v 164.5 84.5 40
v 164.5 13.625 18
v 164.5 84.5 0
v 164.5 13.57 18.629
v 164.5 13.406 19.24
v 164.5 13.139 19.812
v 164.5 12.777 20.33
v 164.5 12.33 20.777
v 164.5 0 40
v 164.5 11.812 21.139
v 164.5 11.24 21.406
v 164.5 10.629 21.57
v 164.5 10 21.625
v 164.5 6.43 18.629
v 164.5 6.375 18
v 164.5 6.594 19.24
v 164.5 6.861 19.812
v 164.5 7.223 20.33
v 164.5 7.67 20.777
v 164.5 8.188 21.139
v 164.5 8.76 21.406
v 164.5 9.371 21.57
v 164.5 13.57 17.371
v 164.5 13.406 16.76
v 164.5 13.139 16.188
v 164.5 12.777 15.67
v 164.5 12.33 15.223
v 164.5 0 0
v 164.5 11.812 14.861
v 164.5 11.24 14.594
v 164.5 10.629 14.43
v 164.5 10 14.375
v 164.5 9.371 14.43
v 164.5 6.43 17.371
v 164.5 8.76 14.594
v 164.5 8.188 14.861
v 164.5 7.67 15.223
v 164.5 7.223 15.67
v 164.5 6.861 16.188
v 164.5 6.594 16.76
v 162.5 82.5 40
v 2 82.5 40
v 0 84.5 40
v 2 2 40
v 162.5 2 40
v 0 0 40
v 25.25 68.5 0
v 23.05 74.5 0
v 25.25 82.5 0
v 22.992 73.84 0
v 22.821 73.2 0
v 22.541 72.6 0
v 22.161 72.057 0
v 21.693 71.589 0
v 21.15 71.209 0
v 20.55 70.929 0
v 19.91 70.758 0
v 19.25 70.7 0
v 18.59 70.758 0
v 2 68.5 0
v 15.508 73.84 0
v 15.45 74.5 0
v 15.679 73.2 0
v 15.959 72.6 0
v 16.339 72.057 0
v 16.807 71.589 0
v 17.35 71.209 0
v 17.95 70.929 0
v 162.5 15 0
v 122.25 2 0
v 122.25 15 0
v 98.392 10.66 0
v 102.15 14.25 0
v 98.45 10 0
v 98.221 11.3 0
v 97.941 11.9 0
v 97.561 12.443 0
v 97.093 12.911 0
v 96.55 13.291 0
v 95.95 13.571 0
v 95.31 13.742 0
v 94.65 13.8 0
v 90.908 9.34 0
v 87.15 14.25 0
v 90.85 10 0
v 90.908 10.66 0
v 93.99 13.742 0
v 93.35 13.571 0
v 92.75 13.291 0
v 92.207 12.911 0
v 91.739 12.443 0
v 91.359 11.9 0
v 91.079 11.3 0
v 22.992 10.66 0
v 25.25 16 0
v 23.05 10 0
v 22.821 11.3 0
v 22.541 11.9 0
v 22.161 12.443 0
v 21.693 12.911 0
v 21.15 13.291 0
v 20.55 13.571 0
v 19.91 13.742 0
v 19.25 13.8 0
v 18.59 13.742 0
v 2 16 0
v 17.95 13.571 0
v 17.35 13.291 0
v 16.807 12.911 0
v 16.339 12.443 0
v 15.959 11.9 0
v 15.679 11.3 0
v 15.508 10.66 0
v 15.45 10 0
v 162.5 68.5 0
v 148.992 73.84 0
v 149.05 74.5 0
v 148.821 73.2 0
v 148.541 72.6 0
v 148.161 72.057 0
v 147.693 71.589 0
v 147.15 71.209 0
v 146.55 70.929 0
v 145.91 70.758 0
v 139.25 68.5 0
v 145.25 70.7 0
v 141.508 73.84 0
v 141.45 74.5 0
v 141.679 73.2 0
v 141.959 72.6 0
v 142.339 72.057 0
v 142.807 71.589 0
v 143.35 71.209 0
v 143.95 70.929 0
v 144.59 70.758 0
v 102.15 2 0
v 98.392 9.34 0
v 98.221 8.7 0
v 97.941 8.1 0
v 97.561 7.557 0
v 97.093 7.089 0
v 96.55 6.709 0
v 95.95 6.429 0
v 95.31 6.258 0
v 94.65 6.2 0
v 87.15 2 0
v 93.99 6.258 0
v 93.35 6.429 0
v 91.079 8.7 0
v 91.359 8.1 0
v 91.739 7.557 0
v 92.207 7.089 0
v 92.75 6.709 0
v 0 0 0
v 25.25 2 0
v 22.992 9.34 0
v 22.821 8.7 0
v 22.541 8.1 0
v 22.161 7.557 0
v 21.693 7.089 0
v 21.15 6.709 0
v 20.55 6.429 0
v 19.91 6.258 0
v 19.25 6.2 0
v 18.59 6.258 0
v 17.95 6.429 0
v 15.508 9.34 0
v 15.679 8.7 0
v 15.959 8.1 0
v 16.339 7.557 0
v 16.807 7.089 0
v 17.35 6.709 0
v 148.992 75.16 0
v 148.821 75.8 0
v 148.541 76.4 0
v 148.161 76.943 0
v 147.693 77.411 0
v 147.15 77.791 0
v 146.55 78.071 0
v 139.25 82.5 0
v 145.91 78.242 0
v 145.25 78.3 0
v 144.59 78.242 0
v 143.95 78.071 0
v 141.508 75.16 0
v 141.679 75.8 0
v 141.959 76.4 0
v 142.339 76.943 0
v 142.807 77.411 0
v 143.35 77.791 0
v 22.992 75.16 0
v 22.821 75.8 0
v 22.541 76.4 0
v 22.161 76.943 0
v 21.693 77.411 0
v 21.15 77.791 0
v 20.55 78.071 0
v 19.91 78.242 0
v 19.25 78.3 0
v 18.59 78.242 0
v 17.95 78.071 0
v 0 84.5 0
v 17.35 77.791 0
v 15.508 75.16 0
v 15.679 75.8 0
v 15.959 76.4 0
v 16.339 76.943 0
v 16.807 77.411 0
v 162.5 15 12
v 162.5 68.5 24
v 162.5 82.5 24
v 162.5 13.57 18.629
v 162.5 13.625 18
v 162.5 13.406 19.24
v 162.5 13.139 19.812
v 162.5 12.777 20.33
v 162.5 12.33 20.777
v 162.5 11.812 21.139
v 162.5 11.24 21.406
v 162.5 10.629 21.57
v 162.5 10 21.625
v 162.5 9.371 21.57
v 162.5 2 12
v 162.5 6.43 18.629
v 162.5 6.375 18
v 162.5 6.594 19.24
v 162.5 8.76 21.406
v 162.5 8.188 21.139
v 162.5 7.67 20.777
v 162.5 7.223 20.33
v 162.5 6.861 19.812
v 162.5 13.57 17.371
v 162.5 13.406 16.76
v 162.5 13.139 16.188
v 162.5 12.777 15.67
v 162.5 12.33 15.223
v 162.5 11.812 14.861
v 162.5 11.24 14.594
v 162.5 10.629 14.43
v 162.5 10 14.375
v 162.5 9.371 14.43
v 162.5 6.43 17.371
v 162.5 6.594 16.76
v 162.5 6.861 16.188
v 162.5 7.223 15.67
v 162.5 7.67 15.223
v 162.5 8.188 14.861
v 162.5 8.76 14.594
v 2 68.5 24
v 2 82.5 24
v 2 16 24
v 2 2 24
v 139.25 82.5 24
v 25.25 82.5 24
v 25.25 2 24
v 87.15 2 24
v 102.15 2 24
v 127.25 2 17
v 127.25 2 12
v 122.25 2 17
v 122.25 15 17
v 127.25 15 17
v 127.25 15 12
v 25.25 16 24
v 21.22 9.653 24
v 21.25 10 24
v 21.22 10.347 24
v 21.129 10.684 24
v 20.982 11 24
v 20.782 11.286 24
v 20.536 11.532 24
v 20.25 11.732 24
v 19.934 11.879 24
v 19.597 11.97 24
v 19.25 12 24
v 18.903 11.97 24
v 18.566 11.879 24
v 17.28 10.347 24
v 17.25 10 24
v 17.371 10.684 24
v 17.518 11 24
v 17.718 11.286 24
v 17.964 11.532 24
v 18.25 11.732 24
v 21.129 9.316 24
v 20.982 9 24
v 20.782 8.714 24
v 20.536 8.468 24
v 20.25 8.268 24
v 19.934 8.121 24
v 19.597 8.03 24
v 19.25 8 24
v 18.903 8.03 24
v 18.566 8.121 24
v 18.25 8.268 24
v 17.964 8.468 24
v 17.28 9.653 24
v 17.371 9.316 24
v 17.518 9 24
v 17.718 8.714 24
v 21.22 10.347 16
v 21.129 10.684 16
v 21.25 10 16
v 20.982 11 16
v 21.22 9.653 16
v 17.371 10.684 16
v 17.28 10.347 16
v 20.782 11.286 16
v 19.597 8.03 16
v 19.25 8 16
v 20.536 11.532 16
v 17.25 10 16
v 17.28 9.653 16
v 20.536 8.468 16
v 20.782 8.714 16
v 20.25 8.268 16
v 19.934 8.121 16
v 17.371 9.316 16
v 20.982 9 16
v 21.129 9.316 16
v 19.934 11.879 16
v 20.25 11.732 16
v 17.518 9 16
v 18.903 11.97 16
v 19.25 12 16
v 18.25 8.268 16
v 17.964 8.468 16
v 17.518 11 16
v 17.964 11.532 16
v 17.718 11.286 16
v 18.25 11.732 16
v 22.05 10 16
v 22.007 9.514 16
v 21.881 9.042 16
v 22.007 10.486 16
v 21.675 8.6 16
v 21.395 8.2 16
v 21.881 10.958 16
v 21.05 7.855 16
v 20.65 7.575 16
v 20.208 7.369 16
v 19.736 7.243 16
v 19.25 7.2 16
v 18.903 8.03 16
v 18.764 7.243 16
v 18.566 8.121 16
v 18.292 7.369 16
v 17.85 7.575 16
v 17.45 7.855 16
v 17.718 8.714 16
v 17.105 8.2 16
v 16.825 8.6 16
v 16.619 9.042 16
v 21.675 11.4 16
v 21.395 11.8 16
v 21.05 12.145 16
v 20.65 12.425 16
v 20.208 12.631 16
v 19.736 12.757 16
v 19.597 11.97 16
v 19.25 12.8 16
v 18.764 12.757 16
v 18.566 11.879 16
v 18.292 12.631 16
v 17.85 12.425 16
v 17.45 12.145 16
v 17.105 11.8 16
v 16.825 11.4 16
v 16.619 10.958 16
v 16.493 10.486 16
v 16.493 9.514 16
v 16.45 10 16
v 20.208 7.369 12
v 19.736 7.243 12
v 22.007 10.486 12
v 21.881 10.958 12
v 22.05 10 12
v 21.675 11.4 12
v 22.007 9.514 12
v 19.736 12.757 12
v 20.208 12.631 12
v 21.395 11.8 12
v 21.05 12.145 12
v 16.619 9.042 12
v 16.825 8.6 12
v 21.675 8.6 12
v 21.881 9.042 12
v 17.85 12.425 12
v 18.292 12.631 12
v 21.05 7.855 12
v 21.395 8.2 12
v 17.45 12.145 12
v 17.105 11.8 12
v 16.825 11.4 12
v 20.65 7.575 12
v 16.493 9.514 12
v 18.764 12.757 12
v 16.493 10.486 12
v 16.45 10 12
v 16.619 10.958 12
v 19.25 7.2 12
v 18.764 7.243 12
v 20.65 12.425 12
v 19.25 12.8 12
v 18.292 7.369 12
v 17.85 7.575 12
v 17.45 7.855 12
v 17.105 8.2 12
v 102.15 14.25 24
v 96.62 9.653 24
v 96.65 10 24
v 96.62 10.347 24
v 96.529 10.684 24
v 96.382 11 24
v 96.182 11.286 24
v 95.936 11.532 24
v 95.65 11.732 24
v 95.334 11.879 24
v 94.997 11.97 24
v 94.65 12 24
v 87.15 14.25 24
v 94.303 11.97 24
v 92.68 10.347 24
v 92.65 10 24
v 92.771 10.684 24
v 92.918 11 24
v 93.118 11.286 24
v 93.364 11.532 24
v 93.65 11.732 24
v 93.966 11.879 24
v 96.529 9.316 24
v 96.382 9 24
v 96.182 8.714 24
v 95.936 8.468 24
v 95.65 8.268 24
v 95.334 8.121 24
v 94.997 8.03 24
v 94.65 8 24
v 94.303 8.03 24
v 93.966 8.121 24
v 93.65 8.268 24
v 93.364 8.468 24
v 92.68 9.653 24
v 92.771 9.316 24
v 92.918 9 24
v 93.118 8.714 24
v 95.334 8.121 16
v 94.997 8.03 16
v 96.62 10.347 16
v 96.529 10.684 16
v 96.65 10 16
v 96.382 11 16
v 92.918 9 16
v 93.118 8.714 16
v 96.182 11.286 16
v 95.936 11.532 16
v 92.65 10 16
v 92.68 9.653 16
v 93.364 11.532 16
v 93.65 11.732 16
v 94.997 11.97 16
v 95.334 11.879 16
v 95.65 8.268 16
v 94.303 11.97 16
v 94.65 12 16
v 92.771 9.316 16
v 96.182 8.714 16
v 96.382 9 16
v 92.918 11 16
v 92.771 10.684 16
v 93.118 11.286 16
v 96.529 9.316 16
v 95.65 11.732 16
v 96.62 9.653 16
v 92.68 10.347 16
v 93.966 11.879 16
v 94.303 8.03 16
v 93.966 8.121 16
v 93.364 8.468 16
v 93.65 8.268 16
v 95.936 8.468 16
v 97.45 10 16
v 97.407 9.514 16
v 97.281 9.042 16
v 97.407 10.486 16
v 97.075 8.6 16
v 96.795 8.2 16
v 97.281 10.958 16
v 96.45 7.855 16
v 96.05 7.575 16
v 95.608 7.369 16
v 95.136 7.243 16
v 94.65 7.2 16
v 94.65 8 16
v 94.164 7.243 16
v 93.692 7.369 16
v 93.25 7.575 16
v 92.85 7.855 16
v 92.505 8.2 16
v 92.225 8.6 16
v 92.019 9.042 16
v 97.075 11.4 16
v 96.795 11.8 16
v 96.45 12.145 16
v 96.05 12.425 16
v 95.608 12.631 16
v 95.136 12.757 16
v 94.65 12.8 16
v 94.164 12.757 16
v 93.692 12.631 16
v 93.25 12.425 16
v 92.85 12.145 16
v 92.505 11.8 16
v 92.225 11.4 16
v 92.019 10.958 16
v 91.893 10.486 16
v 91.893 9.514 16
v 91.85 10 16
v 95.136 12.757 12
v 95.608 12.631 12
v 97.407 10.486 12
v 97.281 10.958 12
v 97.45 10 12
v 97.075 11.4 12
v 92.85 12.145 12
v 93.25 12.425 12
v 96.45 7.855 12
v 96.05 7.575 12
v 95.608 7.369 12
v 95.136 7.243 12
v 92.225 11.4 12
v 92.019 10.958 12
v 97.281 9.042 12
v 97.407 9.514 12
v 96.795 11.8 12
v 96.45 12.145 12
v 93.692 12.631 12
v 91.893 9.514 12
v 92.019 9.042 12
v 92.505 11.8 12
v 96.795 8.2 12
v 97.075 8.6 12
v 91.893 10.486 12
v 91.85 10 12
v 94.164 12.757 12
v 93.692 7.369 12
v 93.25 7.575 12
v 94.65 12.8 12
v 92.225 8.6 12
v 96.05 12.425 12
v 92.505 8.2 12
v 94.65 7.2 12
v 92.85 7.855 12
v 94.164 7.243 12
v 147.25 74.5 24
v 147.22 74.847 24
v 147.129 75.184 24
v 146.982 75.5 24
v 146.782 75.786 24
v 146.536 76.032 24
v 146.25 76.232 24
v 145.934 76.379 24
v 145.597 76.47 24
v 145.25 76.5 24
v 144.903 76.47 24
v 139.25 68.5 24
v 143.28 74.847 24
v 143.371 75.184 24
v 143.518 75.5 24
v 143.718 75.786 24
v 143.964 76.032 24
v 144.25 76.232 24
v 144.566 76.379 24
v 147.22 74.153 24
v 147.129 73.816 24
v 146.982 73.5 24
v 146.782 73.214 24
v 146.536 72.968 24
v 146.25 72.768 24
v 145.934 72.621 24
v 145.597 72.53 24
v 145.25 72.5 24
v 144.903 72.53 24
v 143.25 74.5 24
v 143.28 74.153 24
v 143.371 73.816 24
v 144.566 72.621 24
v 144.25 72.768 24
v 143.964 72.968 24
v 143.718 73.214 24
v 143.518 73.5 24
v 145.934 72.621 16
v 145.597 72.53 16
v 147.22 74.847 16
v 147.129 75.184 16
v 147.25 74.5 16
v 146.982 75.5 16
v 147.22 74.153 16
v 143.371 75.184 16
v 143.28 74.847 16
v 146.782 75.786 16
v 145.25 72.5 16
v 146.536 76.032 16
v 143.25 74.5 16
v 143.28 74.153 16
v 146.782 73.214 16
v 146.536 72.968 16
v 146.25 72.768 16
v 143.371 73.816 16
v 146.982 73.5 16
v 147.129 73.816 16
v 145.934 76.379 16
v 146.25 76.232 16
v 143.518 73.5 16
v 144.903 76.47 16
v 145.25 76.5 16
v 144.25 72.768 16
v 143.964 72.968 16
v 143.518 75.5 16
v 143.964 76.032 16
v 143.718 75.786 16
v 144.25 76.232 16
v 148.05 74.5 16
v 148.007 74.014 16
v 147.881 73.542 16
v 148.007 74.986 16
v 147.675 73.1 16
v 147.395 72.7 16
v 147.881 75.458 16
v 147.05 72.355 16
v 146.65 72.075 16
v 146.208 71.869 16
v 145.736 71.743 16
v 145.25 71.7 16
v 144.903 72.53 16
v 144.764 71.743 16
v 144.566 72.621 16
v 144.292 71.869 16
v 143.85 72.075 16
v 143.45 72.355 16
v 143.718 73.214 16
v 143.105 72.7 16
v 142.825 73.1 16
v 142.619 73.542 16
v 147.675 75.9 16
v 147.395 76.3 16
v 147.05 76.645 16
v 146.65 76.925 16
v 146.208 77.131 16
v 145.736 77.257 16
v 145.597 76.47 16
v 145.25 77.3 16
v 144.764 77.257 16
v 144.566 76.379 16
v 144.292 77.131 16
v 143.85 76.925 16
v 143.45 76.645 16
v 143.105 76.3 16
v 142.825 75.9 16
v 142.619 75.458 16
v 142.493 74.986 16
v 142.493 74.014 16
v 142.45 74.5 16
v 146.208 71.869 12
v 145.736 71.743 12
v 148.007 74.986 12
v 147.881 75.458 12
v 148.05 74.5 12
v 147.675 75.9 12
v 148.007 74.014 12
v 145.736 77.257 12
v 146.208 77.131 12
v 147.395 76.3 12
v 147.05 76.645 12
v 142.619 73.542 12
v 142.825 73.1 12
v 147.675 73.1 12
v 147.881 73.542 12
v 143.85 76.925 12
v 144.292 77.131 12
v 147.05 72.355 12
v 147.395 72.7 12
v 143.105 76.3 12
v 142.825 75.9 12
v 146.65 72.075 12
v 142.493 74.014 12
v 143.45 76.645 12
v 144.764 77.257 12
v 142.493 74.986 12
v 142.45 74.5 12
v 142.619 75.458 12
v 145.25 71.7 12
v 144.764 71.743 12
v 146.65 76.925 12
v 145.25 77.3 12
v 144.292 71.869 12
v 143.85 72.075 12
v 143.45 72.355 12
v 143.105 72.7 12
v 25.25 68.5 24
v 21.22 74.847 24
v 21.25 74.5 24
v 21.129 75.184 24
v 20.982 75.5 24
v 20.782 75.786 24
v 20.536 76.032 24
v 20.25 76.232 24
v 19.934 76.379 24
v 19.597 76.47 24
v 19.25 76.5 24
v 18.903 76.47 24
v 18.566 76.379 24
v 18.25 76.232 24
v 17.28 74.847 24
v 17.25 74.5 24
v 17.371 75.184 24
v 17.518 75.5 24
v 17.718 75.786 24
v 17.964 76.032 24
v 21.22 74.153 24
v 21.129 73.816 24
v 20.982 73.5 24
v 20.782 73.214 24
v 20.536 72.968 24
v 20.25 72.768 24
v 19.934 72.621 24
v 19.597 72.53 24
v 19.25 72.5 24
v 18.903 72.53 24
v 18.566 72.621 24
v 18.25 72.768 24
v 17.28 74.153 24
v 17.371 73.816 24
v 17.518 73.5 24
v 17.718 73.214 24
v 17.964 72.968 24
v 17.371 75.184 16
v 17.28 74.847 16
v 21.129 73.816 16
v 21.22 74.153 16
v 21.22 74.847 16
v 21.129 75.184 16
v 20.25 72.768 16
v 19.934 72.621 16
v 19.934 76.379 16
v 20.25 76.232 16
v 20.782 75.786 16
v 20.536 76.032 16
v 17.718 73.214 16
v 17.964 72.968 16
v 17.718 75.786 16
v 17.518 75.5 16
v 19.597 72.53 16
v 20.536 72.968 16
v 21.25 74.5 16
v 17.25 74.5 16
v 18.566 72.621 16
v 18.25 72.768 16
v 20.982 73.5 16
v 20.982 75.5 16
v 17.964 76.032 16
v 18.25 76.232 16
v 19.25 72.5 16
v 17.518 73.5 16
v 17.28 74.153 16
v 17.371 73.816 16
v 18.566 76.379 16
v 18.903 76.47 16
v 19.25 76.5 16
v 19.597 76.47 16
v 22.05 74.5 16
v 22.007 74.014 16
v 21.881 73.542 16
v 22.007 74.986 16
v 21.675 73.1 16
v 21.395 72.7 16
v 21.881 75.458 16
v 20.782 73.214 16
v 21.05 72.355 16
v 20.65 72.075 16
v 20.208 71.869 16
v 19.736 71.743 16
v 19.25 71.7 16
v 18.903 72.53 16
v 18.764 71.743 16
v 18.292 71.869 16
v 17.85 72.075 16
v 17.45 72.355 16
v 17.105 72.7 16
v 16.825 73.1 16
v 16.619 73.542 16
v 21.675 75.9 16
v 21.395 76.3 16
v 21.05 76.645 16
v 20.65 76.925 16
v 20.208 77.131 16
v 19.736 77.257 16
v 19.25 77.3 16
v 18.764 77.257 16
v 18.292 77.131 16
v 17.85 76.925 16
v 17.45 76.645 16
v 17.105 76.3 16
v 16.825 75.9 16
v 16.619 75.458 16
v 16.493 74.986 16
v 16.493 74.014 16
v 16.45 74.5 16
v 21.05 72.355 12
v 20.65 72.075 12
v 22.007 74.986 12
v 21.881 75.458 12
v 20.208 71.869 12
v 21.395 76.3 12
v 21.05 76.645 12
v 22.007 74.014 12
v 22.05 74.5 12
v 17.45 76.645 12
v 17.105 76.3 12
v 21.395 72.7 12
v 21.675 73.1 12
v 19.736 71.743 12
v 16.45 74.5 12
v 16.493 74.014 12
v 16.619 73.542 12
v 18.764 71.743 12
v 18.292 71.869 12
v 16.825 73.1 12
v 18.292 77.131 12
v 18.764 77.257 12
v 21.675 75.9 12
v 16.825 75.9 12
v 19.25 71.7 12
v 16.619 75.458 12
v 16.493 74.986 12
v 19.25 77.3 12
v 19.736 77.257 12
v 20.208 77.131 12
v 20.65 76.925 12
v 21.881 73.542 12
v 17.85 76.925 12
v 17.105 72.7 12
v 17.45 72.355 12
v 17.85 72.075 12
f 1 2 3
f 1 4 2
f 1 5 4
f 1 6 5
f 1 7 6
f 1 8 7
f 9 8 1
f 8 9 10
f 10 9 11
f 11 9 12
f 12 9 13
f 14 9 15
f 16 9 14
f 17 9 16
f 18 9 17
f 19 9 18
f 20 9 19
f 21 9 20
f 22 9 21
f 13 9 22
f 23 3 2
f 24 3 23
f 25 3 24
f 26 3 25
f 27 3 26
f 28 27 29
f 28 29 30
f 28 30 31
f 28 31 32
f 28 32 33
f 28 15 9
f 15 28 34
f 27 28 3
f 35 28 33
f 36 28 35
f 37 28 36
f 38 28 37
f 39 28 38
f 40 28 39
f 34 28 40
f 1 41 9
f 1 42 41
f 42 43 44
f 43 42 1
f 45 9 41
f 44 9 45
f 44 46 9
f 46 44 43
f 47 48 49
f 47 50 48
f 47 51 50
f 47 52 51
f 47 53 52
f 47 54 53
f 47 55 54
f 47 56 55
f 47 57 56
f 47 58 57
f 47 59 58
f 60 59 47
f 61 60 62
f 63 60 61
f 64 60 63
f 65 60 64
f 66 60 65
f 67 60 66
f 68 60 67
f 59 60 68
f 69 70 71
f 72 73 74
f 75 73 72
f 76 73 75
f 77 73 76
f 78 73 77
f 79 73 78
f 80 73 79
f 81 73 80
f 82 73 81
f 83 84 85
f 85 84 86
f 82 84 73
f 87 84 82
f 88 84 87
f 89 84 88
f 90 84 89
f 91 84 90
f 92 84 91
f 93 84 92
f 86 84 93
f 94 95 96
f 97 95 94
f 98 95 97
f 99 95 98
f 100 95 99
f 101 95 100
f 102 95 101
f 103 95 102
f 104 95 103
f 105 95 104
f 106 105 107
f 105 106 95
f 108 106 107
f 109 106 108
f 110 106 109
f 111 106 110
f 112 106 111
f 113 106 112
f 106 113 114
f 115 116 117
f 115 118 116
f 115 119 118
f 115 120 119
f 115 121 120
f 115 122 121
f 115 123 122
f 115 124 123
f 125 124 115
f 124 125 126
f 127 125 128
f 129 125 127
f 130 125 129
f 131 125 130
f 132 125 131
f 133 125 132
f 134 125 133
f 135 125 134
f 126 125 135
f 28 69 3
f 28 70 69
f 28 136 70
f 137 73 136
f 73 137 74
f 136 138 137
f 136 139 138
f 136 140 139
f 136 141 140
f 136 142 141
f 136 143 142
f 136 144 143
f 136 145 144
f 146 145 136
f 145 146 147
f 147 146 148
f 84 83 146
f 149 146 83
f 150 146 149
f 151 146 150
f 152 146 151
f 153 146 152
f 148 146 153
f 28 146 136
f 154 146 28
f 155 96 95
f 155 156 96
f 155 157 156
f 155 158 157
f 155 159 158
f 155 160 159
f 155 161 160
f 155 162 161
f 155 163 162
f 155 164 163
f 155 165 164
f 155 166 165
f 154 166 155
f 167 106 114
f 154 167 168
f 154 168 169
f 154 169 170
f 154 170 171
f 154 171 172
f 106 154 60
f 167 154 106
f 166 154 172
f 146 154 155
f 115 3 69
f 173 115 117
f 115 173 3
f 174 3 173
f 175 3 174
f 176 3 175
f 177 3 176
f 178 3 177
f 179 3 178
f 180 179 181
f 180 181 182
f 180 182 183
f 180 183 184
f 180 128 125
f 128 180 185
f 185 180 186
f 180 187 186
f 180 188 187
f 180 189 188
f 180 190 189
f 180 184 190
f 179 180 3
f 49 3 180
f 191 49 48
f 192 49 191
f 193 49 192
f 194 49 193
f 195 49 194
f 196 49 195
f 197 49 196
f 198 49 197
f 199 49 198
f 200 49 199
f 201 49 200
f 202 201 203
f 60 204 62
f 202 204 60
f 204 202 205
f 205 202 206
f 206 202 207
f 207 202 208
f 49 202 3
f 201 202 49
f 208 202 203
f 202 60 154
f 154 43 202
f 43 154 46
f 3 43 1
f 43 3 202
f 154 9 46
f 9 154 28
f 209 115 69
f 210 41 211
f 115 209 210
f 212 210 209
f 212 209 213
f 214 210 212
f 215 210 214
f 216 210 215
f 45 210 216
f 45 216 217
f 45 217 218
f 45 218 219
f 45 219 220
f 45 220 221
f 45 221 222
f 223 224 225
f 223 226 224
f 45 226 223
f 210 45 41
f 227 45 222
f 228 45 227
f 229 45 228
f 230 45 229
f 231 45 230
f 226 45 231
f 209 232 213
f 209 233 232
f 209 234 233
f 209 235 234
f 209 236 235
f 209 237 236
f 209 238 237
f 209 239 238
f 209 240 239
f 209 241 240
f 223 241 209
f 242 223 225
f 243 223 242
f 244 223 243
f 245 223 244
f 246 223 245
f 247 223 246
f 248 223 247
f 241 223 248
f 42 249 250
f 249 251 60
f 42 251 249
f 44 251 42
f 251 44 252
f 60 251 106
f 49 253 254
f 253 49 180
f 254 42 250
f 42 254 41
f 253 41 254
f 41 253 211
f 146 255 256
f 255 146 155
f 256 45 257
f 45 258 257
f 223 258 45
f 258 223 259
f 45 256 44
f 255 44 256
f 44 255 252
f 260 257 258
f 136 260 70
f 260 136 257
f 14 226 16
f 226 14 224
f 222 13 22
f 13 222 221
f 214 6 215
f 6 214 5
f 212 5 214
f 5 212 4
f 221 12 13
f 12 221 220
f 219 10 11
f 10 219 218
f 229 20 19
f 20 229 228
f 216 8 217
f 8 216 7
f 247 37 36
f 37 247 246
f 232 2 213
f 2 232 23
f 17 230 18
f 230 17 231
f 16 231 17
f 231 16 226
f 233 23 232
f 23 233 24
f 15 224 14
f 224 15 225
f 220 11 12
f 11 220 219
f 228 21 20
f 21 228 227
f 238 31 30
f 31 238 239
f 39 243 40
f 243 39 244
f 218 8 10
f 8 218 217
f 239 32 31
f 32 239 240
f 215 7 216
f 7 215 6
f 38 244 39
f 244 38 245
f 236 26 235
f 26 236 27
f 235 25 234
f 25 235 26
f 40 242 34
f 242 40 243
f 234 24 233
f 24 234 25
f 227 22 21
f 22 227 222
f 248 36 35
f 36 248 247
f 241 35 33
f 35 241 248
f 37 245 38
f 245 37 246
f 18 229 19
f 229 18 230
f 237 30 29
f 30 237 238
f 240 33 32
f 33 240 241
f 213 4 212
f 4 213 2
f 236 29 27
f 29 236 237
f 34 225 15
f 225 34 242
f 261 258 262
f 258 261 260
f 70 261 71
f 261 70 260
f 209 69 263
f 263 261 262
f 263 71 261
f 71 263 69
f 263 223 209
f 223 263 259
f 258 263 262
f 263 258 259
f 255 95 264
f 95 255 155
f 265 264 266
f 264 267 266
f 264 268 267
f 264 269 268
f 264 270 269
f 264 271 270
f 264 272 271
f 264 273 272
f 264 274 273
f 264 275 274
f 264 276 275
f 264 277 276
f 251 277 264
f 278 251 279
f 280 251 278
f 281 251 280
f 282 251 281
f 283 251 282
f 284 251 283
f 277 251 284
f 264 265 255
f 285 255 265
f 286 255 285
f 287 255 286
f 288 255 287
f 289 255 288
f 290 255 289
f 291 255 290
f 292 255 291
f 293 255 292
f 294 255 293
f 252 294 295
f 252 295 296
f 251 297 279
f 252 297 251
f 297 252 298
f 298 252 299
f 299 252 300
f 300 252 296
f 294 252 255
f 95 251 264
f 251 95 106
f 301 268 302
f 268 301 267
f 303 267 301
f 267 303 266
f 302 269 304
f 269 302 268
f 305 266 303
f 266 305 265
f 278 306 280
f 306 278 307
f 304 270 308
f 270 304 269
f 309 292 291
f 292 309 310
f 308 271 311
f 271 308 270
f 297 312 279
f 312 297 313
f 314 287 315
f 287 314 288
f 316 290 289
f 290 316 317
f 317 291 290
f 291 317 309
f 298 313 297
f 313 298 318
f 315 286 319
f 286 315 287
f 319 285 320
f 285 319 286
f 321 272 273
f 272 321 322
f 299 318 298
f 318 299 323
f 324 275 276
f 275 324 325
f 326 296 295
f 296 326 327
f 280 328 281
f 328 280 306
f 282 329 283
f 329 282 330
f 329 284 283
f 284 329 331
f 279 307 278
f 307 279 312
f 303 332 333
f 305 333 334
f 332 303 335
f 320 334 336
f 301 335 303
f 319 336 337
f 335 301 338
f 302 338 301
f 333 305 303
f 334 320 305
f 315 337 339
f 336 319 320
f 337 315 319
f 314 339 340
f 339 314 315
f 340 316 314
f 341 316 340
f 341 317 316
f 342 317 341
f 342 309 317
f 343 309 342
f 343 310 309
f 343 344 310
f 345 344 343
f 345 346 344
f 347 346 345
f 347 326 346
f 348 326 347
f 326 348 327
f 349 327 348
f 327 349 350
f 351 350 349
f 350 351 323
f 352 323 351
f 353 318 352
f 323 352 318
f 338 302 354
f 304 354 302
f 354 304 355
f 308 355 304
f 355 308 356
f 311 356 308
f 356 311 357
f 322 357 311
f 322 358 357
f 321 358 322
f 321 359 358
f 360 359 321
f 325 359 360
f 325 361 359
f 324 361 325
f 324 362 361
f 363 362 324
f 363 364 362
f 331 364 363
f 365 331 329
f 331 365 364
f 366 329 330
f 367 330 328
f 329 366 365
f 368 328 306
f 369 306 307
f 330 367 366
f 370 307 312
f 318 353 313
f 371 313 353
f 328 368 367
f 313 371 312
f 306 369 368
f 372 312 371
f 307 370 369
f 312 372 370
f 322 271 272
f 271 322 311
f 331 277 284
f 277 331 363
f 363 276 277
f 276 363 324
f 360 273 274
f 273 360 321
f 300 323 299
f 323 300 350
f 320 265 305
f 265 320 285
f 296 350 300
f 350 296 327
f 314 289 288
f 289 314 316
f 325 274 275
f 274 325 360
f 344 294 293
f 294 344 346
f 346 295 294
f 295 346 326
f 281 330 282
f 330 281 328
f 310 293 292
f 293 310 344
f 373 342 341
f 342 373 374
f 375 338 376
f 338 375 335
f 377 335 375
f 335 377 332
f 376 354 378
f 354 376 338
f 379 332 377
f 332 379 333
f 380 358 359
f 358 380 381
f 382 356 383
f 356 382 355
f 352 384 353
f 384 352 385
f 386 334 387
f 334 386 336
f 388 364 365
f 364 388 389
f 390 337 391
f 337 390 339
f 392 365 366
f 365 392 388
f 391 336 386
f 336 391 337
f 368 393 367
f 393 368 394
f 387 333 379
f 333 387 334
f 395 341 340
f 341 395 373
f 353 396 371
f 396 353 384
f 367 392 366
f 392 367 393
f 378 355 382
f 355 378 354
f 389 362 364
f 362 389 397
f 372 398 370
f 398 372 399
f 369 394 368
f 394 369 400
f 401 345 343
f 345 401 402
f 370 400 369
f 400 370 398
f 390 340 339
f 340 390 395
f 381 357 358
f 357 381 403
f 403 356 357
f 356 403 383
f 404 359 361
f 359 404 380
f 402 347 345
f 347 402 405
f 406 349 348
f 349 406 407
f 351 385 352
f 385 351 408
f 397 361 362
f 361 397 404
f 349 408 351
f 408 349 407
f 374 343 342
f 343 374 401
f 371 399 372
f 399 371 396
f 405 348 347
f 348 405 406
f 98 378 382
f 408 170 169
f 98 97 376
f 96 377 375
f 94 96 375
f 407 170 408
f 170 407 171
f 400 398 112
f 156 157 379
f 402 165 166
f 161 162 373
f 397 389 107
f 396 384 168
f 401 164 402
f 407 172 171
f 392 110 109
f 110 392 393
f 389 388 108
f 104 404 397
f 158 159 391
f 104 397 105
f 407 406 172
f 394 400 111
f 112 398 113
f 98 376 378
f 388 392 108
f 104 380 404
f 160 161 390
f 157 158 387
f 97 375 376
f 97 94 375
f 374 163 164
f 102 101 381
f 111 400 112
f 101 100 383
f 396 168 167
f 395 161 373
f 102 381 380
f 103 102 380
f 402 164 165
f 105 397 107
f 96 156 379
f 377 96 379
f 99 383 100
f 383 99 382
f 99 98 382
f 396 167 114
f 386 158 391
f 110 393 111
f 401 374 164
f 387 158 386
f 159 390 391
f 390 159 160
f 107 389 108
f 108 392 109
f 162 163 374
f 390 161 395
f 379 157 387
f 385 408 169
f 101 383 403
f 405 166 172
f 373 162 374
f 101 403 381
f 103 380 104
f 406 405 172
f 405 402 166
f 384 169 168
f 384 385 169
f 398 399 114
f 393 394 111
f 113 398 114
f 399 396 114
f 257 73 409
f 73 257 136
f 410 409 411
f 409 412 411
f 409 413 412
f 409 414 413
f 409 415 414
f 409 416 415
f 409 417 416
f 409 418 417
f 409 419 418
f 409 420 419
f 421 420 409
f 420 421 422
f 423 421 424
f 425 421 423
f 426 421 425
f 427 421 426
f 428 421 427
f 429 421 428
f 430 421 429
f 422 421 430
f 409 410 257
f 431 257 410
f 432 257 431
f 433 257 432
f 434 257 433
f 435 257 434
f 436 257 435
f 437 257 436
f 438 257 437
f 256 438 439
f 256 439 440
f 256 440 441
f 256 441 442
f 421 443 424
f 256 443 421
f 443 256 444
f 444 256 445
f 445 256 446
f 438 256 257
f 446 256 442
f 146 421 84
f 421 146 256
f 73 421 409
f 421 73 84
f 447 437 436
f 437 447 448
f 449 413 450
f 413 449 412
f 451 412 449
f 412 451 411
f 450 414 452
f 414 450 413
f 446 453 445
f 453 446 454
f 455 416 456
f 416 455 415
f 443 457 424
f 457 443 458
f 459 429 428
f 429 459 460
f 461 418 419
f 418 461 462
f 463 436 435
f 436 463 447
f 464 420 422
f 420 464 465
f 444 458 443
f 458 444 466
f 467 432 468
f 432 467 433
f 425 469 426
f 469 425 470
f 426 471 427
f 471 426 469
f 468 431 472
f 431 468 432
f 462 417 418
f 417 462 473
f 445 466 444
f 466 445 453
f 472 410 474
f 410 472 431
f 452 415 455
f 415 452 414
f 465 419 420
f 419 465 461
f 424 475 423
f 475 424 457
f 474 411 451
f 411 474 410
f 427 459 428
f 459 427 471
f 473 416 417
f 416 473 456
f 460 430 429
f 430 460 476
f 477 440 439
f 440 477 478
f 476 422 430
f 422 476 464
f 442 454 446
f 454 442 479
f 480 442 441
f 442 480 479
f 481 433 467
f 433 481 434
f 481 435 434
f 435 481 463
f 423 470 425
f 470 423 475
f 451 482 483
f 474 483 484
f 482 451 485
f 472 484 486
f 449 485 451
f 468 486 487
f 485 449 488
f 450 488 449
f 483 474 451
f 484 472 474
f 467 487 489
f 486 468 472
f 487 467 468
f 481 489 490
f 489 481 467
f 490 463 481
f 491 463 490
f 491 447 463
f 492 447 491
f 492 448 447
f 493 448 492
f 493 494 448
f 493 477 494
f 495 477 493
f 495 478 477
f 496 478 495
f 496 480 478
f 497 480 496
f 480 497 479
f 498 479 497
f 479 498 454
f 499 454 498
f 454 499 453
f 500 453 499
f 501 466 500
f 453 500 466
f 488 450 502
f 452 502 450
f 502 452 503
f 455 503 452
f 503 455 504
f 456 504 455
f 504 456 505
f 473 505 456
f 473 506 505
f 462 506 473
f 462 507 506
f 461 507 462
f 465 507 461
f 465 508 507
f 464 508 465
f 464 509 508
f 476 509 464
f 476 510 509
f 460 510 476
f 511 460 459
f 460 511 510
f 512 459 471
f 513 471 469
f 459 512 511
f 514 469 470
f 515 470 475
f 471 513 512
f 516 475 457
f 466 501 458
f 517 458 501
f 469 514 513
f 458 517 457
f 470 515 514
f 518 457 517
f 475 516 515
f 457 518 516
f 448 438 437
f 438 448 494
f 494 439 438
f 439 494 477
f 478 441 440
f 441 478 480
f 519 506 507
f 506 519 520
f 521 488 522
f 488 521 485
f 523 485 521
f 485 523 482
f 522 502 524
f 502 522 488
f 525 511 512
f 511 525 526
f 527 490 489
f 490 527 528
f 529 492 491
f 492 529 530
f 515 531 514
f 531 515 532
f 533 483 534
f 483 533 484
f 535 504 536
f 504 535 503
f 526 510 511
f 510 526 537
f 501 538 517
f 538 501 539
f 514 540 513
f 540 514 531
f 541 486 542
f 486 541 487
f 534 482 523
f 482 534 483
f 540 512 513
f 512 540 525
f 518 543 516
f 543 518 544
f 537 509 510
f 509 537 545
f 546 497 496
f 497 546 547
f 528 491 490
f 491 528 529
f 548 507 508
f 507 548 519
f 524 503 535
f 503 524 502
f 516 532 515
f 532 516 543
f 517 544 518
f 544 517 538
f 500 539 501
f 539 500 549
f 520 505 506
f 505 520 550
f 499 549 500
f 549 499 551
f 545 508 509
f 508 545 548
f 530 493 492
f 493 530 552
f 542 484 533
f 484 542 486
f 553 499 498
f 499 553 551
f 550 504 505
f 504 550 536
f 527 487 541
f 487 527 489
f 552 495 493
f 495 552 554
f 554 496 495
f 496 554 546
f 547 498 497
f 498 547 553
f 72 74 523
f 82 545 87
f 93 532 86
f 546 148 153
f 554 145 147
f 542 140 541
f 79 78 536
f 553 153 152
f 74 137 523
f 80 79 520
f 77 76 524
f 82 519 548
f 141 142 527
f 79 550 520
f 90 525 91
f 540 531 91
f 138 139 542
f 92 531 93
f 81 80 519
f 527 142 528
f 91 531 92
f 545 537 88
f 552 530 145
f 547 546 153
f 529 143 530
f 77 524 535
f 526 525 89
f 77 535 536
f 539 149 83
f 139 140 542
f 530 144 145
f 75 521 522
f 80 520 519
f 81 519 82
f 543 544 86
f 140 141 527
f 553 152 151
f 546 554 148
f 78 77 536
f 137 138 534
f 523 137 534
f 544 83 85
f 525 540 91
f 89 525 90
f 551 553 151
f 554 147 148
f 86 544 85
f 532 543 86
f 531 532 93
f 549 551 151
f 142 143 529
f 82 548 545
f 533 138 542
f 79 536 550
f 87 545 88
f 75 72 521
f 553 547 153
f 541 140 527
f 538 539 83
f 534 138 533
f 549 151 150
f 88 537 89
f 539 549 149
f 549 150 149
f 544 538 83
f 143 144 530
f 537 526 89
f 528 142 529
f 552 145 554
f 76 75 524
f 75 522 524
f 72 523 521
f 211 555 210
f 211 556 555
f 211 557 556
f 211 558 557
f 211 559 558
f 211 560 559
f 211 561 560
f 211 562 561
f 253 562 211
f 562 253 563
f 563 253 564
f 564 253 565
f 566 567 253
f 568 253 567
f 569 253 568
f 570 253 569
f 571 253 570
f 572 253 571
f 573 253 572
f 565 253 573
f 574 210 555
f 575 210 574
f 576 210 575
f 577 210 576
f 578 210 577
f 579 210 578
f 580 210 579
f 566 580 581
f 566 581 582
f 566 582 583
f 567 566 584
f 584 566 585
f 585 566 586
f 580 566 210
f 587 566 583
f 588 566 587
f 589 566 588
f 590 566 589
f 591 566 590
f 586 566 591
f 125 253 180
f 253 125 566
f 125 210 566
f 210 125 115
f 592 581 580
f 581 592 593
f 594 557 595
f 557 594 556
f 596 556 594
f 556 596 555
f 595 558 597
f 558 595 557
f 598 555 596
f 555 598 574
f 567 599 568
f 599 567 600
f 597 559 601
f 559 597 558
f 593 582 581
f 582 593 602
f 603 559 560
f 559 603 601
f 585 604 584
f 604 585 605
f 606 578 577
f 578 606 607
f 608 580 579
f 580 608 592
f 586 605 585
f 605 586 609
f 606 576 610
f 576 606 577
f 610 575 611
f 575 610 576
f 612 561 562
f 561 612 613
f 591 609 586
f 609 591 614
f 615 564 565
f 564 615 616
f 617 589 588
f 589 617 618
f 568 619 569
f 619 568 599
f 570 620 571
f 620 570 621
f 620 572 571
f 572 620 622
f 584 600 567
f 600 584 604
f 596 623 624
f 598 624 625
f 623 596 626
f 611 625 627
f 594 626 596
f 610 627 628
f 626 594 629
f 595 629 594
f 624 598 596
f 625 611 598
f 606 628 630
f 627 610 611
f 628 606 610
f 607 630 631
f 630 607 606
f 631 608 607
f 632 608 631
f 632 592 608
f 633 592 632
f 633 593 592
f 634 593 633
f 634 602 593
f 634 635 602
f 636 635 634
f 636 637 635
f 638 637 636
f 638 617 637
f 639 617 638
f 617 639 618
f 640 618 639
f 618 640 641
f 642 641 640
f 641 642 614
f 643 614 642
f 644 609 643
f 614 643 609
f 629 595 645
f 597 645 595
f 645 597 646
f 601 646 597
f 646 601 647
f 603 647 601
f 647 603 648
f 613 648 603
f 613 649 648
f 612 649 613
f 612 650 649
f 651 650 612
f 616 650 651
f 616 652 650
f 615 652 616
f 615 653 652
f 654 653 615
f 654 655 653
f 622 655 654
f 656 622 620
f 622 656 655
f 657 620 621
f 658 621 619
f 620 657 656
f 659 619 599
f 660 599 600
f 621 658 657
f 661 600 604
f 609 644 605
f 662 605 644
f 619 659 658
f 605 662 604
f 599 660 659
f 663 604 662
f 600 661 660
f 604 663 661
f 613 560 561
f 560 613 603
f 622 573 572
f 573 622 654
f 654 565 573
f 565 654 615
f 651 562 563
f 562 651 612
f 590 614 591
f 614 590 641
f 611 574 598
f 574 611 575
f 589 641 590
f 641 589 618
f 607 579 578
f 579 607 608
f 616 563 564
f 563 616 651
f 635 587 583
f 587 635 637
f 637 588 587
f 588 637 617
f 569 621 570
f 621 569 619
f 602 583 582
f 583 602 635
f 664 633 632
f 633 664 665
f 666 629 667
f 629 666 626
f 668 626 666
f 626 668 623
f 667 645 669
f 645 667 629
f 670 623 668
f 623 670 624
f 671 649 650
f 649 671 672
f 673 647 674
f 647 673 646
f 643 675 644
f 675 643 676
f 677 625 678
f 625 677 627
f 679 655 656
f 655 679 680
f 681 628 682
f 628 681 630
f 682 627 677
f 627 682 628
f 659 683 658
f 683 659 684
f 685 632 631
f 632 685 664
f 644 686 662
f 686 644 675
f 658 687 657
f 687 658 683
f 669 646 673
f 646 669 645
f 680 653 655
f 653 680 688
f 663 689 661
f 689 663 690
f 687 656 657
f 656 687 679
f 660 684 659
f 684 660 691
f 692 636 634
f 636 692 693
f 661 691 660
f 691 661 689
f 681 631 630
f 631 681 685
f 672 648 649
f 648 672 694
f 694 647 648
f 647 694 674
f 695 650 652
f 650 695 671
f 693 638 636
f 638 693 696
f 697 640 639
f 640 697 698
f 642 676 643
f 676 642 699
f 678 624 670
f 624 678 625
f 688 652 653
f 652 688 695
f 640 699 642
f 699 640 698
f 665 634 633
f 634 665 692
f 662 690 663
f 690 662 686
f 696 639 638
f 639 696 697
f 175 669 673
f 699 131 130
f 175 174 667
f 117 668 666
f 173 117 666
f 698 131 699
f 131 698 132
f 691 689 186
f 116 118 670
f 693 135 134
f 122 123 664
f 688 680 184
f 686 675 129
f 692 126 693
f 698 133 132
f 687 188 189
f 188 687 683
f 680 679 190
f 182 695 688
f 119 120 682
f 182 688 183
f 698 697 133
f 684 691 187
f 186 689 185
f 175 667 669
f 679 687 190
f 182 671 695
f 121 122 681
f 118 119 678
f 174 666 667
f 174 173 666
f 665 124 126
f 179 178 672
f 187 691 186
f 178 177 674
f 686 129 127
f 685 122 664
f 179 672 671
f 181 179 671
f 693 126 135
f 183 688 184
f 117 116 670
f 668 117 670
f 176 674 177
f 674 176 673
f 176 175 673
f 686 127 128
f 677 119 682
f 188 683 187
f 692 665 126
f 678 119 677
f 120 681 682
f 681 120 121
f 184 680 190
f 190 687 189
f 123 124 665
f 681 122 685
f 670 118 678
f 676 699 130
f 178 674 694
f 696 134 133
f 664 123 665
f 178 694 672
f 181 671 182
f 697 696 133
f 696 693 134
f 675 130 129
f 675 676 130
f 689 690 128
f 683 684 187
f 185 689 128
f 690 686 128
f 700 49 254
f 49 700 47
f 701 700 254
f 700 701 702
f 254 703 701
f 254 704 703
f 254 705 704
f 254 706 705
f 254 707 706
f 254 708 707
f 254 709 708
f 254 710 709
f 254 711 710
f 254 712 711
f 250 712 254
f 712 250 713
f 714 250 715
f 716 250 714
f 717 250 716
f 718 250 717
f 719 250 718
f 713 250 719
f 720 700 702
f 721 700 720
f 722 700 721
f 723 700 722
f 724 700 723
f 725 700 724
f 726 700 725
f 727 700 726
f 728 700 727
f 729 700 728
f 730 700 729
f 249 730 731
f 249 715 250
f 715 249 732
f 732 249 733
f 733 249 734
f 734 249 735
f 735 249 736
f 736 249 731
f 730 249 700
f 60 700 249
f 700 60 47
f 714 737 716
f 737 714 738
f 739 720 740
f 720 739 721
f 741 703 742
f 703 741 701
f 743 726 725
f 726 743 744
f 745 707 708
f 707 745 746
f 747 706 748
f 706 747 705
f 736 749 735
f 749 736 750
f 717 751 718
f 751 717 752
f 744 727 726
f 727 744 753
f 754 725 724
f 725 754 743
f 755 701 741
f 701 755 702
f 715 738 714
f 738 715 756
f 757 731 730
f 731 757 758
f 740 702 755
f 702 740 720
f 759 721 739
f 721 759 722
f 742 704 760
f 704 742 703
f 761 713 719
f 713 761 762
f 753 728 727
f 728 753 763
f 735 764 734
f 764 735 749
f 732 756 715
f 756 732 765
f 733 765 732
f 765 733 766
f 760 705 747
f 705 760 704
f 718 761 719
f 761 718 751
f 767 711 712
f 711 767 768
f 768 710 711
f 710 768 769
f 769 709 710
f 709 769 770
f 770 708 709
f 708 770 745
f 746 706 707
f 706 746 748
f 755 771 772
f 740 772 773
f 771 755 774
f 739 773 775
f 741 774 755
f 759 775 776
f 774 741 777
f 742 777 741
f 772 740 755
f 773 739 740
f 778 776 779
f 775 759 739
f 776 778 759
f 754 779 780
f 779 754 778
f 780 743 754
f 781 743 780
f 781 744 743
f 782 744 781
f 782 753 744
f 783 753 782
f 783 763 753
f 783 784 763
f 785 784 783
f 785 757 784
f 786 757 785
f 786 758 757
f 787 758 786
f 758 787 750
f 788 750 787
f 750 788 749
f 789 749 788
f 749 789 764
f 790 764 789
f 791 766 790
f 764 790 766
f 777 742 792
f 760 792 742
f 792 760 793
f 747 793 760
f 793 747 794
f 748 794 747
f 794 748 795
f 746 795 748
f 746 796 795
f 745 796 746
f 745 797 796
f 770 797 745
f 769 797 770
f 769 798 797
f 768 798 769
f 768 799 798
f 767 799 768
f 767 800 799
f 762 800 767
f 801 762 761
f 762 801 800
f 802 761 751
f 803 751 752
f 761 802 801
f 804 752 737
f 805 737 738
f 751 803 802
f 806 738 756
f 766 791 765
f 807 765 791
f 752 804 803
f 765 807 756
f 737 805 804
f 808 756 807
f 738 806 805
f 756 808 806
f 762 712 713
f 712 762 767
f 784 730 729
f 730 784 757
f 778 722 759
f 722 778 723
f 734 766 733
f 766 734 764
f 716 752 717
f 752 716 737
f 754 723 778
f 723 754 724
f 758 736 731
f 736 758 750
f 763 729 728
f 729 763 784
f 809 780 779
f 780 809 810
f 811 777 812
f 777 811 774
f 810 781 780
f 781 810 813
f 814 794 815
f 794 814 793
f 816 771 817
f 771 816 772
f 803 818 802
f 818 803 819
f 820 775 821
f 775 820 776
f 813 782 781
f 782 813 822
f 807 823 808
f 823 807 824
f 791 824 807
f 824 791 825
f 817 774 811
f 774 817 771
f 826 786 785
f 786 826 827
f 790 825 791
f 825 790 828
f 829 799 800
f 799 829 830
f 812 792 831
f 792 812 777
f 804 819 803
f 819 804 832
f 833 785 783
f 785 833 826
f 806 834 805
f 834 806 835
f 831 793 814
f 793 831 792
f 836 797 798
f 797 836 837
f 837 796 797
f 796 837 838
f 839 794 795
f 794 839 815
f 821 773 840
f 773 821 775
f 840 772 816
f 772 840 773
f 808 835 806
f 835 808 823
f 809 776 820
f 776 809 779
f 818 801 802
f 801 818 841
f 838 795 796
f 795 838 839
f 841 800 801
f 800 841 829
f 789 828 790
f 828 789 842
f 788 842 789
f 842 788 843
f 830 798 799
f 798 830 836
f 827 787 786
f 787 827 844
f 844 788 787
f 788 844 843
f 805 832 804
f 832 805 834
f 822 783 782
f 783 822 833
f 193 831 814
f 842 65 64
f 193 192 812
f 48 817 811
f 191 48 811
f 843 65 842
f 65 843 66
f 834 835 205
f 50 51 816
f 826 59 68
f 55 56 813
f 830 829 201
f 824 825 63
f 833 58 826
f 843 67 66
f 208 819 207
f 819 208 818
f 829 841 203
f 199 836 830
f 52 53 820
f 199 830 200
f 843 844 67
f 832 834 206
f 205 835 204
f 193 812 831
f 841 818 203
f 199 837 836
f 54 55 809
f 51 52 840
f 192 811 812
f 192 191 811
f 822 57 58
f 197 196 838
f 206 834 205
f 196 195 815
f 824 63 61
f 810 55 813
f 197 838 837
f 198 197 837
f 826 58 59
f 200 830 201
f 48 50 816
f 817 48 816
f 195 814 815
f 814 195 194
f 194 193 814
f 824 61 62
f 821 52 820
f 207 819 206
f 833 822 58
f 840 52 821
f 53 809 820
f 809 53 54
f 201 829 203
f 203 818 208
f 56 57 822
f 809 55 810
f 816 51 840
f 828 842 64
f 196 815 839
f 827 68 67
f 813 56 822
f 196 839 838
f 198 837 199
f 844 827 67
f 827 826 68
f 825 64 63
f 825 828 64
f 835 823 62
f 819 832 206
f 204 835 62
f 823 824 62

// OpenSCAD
//Hub75 Matrix LED Case (with custom pcb on back)
//jkl 20210528

draftingFNs = 36;
renderFNs = 180;
$fn = draftingFNs;

caseFrontZpadding = 1;
screenWidth = 160+2-1.5; //too wide for calipers, assume double height, +2 for fit, -1.5 after full back test print
screenHeight = 80+1-0.5; //80.09 measured, 78.5 height at back of panel. 0.75mm diff each side, +1 for fit, -0.5 after full back test print
screenDepth = 15+caseFrontZpadding; //14.91 measured, +caseFrontZpadding for slight lip beyond leds

cornerScrewXinset = 17.25;//16.5 in from right side, assume same 0.75 slant, 17.25 in from right then
cornerScrewYinset = 8;//7.2mm from top, add 0.75, 8 down from top?
screwBuffer = 6; //extra material around screw hole in x & y directions

//using m3x16, fits t10 bit
screwShaftHoleDepth = 8; //expect some sagging of first few layers
screwShaftHoleRad = (3+1)/2; //m3 + some
screwHeadHoleDepth = 4;
screwHeadHoleRad = 5.6/2; //measured at 5.4 diam
caseExtraPaddingDepth = 6;

caseDepth = 40;//maybe 40 (bc of pcbs etc)
caseBackDepth = caseDepth - screenDepth; //caseExtraPaddingDepth + screwShaftHoleDepth;

caseWallThickness = 2;
caseWidth = screenWidth + caseWallThickness*2;
caseHeight = screenHeight + caseWallThickness*2;

//power plug center is 21mm from front with 15mm deep screen so 6
plugZoffset = caseDepth - screenDepth - 6; //this is to center of power plug
plugYoffset = 8;
plugZ = 12;
plugDiam = 7.25;
plugRad = plugDiam/2;
//plugX = 36; //this is without cables and wo silver barrel
plugX = 36-0.75; //this is without cables and wo silver barrel
plugWireZpadding = 5;
plugWireBackerX = 5;
//full width is 13-14
plugBackerY = 13;

//measured plug and ScreenZ = 26;

plugBackerZ = caseDepth - screenDepth - plugZ;
plugWireBackerZ = caseDepth - screenDepth - plugZ + plugWireZpadding;


middleBackerScrewXoffset = 92 + 2.15 - 1.5; //92 is to middle of screw hole, 2.15 mesaured adjustment factor after test print, 1.5 moved back after full back test print - NB offset from x=0
middleBackerX = 15;
middleBackerY = 12.25;
middleBackerXoffset = middleBackerScrewXoffset - middleBackerX/2;

keyholeScrewShaftDiam = 3.75;//measured at 3.45
keyholeScrewHeadDiam = 8;//measured at 6.75, but make large for future flexbility?
keyholeScrewHeadDepth = 5;//15.25 total length, 2.5 head depth, measured
keyholeBackDepth = 3; //amount between wall and screw head


/* TODO
x- fix screw hole offsets - measure x-gap btw case and matrix - gap is 1.5mm
- space on top for physical buttons
- keyhole hangers - make at same spot as top two corner screw holes
- back vents?
  - for vents, make screw hole/plug supports larger (by wallThickness) to go into case, this way they then won't be cut up by vent shapes that difference the main shell, but the vents can still perforate most of case wall edge
  - oooooh or, just make vents with slicer modifaction parts , honeycomb infill with no perimeters? octogram spiral looks good for x=constant walls, honeycomb for z=0? bottom y=0 type?
- hole in top for usb cord, and dust cover

** Maybe **

-make wall that holds power lug in, 2mm higher

*/


//outer wall
difference(){
    //outside
    cube([caseWidth,caseHeight,caseDepth]);
    
    //remove inside cube
    //TODO don't remove some of back wall and perforate with vents
    translate([caseWallThickness,caseWallThickness,0]){
        cube([screenWidth,screenHeight,caseDepth]);
    }
    
    //remove power plug cylinder
    translate([caseWidth,caseWallThickness+plugYoffset,plugZoffset]){
        rotate([0,-90,0]){
            cylinder(caseWallThickness,plugRad,plugRad);
        }
    }
}


//bottom right corner, power plug backer/holder
difference(){
    //main block that is behind wires
    translate([caseWidth-caseWallThickness-(plugX+plugWireBackerX),caseWallThickness,0]){
        cube([plugX+plugWireBackerX,plugBackerY,plugWireBackerZ]);
    }
    
    //remove block for main plug body
    translate([caseWidth-caseWallThickness-plugX,caseWallThickness,plugBackerZ]){
        cube([plugX,cornerScrewYinset+screwBuffer,plugZ]);
    }
}


//lower left corner
difference(){
    translate([caseWallThickness,caseWallThickness,0]){
        cube([cornerScrewXinset+screwBuffer,cornerScrewYinset+screwBuffer,caseBackDepth]);
    }
    //screwshaft
    translate([caseWallThickness+cornerScrewXinset,caseWallThickness+cornerScrewYinset,caseBackDepth-screwShaftHoleDepth]){
        cylinder(screwShaftHoleDepth, screwShaftHoleRad, screwShaftHoleRad);
    }
    //screwhead
    translate([caseWallThickness+cornerScrewXinset,caseWallThickness+cornerScrewYinset,caseBackDepth-screwShaftHoleDepth-screwHeadHoleDepth]){
        cylinder(screwHeadHoleDepth, screwHeadHoleRad, screwHeadHoleRad);
    }
    //screwshaft
    translate([caseWallThickness+cornerScrewXinset,caseWallThickness+cornerScrewYinset,0]){
        cylinder(caseBackDepth-screwHeadHoleDepth-screwShaftHoleDepth, screwHeadHoleRad+1, screwHeadHoleRad);
    }
}

//lower middle support
difference(){
    translate([caseWallThickness+middleBackerXoffset,caseWallThickness,0]){
        cube([middleBackerX,middleBackerY,caseBackDepth]);
    }
    //screwshaft
    translate([caseWallThickness+middleBackerScrewXoffset,caseWallThickness+cornerScrewYinset,caseBackDepth-screwShaftHoleDepth]){
        cylinder(screwShaftHoleDepth, screwShaftHoleRad, screwShaftHoleRad);
    }
    //screwhead
    translate([caseWallThickness+middleBackerScrewXoffset,caseWallThickness+cornerScrewYinset,caseBackDepth-screwShaftHoleDepth-screwHeadHoleDepth]){
        cylinder(screwHeadHoleDepth, screwHeadHoleRad, screwHeadHoleRad);
    }
    //screwshaft
    translate([caseWallThickness+middleBackerScrewXoffset,caseWallThickness+cornerScrewYinset,0]){
        cylinder(caseBackDepth-screwHeadHoleDepth-screwShaftHoleDepth, screwHeadHoleRad+1, screwHeadHoleRad);
    }
}

//top right corner
difference(){
    translate([caseWidth-caseWallThickness-(cornerScrewXinset+screwBuffer),caseHeight-caseWallThickness-(cornerScrewYinset+screwBuffer),0]){
        cube([cornerScrewXinset+screwBuffer,cornerScrewYinset+screwBuffer,caseBackDepth]);
    }
    //screwshaft
    translate([caseWidth-caseWallThickness-cornerScrewXinset,caseHeight-caseWallThickness-cornerScrewYinset,caseBackDepth-screwShaftHoleDepth]){
        cylinder(screwShaftHoleDepth, screwShaftHoleRad, screwShaftHoleRad);
    }
    //screwhead
    translate([caseWidth-caseWallThickness-cornerScrewXinset,caseHeight-caseWallThickness-cornerScrewYinset,caseBackDepth-screwShaftHoleDepth-screwHeadHoleDepth]){
        cylinder(screwHeadHoleDepth, screwHeadHoleRad, screwHeadHoleRad);
    }
    //screwshaft
    translate([caseWidth-caseWallThickness-cornerScrewXinset,caseHeight-caseWallThickness-cornerScrewYinset,0]){
        cylinder(caseBackDepth-screwHeadHoleDepth-screwShaftHoleDepth, screwHeadHoleRad+1, screwHeadHoleRad);
    }
}

//top left corner
difference(){
    translate([caseWallThickness,caseHeight-caseWallThickness-(cornerScrewYinset+screwBuffer),0]){
        cube([cornerScrewXinset+screwBuffer,cornerScrewYinset+screwBuffer,caseBackDepth]);
    }
    //screwshaft
    translate([caseWallThickness+cornerScrewXinset,caseHeight-caseWallThickness-cornerScrewYinset,caseBackDepth-screwShaftHoleDepth]){
        cylinder(screwShaftHoleDepth, screwShaftHoleRad, screwShaftHoleRad);
    }
    //screwhead
    translate([caseWallThickness+cornerScrewXinset,caseHeight-caseWallThickness-cornerScrewYinset,caseBackDepth-screwShaftHoleDepth-screwHeadHoleDepth]){
        cylinder(screwHeadHoleDepth, screwHeadHoleRad, screwHeadHoleRad);
    }
    //screwshaft
    translate([caseWallThickness+cornerScrewXinset,caseHeight-caseWallThickness-cornerScrewYinset,0]){
        cylinder(caseBackDepth-screwHeadHoleDepth-screwShaftHoleDepth, screwHeadHoleRad+1, screwHeadHoleRad);
    }
}
